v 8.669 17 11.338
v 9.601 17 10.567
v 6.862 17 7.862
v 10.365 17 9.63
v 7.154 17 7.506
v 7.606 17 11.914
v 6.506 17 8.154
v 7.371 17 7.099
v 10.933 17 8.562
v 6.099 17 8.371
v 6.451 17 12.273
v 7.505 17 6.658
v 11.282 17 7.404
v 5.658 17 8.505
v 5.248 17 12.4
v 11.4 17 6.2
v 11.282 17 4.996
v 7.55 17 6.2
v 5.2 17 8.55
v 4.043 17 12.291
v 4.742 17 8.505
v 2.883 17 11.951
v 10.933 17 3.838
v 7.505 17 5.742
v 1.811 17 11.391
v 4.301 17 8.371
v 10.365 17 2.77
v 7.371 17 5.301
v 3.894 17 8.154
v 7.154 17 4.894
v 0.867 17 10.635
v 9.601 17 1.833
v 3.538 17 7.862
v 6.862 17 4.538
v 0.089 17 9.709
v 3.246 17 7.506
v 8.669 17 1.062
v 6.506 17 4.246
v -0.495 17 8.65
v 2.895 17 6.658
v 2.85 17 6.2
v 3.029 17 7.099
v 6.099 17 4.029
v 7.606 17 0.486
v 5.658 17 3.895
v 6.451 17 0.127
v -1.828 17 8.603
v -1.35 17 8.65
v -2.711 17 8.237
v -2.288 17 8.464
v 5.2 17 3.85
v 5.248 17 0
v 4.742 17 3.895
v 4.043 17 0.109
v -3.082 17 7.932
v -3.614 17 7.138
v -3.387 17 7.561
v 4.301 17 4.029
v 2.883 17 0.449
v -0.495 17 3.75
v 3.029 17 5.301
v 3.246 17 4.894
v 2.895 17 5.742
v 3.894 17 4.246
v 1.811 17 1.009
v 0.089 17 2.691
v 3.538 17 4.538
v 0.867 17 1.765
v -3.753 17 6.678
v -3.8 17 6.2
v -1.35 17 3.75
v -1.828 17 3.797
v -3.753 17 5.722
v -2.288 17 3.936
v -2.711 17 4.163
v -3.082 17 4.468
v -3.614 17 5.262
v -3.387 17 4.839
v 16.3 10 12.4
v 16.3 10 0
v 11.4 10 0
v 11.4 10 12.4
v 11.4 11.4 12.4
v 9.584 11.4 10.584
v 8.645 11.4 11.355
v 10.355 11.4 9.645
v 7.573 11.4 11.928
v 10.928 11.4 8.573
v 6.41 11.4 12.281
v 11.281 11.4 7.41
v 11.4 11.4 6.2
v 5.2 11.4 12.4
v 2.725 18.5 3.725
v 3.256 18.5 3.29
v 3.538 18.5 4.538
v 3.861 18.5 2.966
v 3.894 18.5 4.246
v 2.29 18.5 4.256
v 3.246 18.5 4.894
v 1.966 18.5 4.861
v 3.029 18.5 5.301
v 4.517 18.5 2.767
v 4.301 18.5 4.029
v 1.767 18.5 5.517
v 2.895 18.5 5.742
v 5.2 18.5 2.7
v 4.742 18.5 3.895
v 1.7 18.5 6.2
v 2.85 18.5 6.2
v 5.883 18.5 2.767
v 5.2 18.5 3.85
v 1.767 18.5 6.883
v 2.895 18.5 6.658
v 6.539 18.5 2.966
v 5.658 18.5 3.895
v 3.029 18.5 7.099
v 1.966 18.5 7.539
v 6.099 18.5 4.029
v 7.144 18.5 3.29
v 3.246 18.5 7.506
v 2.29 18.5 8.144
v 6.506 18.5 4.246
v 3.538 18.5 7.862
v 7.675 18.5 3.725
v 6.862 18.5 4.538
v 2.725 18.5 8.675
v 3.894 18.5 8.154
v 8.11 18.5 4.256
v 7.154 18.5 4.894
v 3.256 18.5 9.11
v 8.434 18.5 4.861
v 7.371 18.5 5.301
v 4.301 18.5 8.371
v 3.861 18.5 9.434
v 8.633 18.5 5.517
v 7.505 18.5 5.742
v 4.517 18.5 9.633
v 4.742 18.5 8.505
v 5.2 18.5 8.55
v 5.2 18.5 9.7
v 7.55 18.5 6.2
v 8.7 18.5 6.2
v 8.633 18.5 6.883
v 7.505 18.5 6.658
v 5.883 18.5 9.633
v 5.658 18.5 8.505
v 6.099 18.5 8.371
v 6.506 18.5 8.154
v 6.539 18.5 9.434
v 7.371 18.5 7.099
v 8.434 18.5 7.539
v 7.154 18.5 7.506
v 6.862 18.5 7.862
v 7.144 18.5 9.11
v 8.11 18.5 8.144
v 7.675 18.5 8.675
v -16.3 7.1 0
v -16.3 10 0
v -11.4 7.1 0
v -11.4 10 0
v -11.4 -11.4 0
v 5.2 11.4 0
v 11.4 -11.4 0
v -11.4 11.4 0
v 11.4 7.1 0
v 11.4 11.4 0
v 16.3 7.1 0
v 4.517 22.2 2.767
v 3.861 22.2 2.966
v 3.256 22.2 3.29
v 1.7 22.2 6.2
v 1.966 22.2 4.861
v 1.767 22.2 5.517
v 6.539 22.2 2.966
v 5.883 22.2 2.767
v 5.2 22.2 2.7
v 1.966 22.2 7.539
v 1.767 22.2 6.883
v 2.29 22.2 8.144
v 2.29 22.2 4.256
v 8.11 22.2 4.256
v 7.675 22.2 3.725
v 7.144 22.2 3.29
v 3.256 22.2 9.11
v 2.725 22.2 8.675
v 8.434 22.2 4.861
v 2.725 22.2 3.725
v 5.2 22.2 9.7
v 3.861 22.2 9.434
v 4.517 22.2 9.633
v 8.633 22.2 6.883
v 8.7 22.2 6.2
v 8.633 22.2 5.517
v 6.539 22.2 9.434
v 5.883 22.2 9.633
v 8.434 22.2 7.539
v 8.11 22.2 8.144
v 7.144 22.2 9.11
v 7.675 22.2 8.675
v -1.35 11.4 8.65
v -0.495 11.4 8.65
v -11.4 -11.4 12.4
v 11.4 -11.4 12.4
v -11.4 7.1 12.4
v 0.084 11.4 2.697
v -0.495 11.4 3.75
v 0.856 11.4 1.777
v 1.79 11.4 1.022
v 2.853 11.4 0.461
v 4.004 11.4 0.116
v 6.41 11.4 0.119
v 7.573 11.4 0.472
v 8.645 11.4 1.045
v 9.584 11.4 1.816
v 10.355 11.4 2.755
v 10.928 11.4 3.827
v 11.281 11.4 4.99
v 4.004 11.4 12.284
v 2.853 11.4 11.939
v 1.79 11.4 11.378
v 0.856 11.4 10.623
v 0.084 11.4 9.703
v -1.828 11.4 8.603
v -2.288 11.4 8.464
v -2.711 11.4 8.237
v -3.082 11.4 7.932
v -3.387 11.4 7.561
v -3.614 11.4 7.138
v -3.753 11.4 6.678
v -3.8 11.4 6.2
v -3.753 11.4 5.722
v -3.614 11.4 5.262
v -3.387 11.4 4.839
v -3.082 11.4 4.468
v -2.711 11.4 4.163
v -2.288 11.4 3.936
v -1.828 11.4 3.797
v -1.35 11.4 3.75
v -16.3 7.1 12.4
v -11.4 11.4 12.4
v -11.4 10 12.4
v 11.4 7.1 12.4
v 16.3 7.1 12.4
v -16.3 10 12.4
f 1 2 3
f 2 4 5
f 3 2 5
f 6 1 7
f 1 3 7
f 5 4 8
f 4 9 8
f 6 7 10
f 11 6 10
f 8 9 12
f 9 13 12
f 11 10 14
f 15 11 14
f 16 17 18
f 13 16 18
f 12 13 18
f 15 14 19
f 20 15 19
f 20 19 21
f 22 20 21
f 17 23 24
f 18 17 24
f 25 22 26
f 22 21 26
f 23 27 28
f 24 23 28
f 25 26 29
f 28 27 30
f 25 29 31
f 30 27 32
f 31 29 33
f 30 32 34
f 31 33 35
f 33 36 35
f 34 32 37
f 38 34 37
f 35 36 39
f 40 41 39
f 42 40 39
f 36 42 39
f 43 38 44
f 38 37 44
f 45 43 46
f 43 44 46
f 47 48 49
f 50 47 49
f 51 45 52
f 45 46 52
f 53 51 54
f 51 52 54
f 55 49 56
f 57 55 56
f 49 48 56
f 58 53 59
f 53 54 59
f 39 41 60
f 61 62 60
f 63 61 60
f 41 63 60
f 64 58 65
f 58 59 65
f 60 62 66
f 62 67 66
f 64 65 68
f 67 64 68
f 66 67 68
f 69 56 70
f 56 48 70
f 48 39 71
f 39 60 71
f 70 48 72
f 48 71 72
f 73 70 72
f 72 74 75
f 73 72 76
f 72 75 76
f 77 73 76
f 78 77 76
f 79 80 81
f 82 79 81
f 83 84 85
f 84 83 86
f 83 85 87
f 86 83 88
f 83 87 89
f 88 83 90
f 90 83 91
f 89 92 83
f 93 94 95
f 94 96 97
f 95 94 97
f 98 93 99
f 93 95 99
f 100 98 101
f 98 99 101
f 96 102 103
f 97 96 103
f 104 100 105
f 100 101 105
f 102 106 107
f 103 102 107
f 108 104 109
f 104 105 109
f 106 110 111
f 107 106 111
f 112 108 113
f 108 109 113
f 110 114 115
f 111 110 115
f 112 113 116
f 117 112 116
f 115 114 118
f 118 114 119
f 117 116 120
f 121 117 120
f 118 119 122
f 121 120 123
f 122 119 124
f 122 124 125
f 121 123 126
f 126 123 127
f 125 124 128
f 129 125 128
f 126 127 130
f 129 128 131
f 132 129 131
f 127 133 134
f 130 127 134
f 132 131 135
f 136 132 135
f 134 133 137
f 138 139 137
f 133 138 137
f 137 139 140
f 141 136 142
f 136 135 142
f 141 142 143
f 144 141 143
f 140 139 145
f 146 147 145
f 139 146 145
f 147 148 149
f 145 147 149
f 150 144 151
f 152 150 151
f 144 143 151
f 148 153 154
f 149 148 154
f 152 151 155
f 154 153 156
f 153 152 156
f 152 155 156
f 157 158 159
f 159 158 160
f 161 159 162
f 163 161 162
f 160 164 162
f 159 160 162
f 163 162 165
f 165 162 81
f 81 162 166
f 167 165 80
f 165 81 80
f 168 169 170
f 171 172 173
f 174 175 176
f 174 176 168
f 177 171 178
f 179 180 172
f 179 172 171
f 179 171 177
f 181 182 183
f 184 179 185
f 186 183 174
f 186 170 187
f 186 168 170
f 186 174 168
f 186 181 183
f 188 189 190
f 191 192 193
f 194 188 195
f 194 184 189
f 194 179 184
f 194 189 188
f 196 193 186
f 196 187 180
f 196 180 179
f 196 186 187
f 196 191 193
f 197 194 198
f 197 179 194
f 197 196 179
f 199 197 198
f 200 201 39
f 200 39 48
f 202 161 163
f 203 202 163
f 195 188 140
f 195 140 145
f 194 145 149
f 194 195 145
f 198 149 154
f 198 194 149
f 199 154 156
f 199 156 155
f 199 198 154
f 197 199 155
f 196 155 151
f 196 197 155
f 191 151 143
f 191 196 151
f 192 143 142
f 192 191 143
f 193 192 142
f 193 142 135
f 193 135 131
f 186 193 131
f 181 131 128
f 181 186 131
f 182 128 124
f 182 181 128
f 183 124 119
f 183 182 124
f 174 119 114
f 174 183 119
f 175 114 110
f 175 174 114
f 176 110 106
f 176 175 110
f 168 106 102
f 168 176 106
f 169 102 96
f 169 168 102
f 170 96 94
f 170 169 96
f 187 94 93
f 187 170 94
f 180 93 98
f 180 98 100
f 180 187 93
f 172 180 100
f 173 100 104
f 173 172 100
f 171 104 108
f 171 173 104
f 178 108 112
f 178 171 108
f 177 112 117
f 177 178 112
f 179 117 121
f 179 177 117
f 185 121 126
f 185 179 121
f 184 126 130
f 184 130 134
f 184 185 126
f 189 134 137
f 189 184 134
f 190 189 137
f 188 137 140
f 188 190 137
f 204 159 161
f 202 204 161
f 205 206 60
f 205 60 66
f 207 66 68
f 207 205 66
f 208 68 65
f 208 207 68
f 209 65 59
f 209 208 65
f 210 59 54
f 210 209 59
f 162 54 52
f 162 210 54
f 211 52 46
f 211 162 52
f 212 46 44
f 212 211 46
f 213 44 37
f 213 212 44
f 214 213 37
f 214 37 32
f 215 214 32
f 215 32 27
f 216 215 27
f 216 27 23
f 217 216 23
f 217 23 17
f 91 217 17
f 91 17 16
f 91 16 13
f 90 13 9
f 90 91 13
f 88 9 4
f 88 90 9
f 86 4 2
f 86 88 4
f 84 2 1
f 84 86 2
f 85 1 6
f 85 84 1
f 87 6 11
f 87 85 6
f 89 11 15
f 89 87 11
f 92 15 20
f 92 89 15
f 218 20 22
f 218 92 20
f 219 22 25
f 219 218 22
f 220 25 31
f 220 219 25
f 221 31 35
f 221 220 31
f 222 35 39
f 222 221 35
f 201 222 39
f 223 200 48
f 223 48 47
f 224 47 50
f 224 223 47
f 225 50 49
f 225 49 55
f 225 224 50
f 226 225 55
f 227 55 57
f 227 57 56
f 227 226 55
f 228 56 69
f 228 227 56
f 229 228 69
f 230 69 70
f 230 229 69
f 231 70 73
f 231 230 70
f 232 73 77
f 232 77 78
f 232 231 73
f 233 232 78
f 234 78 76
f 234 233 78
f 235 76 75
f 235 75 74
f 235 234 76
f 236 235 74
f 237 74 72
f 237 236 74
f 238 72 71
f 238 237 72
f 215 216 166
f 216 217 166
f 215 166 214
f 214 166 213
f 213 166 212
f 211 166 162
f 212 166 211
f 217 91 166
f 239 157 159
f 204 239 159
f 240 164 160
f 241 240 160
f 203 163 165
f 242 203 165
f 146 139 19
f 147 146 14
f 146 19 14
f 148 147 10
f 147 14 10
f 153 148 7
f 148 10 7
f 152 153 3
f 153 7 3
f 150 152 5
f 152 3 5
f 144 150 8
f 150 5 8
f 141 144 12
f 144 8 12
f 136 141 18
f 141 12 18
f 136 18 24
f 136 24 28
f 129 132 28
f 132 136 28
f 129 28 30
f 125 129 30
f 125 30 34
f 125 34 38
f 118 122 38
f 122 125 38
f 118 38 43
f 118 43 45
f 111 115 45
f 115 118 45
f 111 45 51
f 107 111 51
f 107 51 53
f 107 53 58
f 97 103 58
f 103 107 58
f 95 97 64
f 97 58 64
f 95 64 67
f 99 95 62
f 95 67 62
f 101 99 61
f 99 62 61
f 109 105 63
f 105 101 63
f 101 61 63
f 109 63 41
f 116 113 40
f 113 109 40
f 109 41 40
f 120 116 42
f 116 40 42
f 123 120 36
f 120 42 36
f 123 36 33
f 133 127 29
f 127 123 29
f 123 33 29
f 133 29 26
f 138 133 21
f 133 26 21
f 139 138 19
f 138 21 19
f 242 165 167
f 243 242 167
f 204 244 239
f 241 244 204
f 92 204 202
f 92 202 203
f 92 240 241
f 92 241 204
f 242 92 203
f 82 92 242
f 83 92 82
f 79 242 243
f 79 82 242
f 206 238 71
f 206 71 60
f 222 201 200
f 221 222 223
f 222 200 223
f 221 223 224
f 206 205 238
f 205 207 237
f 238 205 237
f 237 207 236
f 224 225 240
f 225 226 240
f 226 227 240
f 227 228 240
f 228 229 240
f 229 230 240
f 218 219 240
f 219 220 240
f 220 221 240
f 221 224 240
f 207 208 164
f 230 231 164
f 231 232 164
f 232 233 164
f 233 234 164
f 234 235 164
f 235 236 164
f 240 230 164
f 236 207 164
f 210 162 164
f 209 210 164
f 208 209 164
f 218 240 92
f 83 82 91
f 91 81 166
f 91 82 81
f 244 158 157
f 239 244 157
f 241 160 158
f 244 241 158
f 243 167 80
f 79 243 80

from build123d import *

# Parameters (mm, degrees)
BOSS_EXTRU_1_DEPTH = 12.4
BOSS_EXTRU_2_DEPTH = 5.6
ESQUISSE3_R        = 2.35
BOSS_EXTRU_3_DEPTH = 5.2
ESQUISSE4_R        = 3.5
BOSS_EXTRU_4_DEPTH = 3.7


with BuildPart() as part:
    # Esquisse1 → Boss.-Extru.1 (new body)
    with BuildSketch(Plane.XY):
        Polygon((-11.4, 10), (-16.3, 10), (-16.3, 7.1), (-11.4, 7.1), (-11.4, -11.4), (11.4, -11.4), (11.4, 7.1), (16.3, 7.1), (16.3, 10), (11.4, 10), (11.4, 11.4), (-11.4, 11.4), align=None)
    extrude(amount=BOSS_EXTRU_1_DEPTH)

    # Esquisse2 → Boss.-Extru.2 (add)
    with BuildSketch(Plane(origin=(0, 11.4, 0), x_dir=(1, 0, 0), z_dir=(0, 1, 0))):
        with BuildLine():
            Line((-1.35, -3.75), (-0.495392875, -3.75))
            ThreePointArc((-0.495392875, -3.75), (11.4, -6.2), (-0.495392875, -8.65))
            Line((-0.495392875, -8.65), (-1.35, -8.65))
            ThreePointArc((-1.35, -8.65), (-3.8, -6.2), (-1.35, -3.75))
        make_face()
    extrude(amount=BOSS_EXTRU_2_DEPTH)

    # Esquisse3 → Boss.-Extru.3 (add)
    with BuildSketch(Plane(origin=(0, 17, 0), x_dir=(1, 0, 0), z_dir=(0, 1, 0))):
        with Locations(Location((5.2, -6.2, 0), (0, 0, 270))):
            Circle(ESQUISSE3_R)
    extrude(amount=BOSS_EXTRU_3_DEPTH)

    # Esquisse4 → Boss.-Extru.4 (add)
    with BuildSketch(Plane(origin=(0, 22.2, 0), x_dir=(1, 0, 0), z_dir=(0, 1, 0))):
        with Locations(Location((5.2, -6.2, 0), (0, 0, 270))):
            Circle(ESQUISSE4_R)
    extrude(amount=-BOSS_EXTRU_4_DEPTH)


solid = part.part
